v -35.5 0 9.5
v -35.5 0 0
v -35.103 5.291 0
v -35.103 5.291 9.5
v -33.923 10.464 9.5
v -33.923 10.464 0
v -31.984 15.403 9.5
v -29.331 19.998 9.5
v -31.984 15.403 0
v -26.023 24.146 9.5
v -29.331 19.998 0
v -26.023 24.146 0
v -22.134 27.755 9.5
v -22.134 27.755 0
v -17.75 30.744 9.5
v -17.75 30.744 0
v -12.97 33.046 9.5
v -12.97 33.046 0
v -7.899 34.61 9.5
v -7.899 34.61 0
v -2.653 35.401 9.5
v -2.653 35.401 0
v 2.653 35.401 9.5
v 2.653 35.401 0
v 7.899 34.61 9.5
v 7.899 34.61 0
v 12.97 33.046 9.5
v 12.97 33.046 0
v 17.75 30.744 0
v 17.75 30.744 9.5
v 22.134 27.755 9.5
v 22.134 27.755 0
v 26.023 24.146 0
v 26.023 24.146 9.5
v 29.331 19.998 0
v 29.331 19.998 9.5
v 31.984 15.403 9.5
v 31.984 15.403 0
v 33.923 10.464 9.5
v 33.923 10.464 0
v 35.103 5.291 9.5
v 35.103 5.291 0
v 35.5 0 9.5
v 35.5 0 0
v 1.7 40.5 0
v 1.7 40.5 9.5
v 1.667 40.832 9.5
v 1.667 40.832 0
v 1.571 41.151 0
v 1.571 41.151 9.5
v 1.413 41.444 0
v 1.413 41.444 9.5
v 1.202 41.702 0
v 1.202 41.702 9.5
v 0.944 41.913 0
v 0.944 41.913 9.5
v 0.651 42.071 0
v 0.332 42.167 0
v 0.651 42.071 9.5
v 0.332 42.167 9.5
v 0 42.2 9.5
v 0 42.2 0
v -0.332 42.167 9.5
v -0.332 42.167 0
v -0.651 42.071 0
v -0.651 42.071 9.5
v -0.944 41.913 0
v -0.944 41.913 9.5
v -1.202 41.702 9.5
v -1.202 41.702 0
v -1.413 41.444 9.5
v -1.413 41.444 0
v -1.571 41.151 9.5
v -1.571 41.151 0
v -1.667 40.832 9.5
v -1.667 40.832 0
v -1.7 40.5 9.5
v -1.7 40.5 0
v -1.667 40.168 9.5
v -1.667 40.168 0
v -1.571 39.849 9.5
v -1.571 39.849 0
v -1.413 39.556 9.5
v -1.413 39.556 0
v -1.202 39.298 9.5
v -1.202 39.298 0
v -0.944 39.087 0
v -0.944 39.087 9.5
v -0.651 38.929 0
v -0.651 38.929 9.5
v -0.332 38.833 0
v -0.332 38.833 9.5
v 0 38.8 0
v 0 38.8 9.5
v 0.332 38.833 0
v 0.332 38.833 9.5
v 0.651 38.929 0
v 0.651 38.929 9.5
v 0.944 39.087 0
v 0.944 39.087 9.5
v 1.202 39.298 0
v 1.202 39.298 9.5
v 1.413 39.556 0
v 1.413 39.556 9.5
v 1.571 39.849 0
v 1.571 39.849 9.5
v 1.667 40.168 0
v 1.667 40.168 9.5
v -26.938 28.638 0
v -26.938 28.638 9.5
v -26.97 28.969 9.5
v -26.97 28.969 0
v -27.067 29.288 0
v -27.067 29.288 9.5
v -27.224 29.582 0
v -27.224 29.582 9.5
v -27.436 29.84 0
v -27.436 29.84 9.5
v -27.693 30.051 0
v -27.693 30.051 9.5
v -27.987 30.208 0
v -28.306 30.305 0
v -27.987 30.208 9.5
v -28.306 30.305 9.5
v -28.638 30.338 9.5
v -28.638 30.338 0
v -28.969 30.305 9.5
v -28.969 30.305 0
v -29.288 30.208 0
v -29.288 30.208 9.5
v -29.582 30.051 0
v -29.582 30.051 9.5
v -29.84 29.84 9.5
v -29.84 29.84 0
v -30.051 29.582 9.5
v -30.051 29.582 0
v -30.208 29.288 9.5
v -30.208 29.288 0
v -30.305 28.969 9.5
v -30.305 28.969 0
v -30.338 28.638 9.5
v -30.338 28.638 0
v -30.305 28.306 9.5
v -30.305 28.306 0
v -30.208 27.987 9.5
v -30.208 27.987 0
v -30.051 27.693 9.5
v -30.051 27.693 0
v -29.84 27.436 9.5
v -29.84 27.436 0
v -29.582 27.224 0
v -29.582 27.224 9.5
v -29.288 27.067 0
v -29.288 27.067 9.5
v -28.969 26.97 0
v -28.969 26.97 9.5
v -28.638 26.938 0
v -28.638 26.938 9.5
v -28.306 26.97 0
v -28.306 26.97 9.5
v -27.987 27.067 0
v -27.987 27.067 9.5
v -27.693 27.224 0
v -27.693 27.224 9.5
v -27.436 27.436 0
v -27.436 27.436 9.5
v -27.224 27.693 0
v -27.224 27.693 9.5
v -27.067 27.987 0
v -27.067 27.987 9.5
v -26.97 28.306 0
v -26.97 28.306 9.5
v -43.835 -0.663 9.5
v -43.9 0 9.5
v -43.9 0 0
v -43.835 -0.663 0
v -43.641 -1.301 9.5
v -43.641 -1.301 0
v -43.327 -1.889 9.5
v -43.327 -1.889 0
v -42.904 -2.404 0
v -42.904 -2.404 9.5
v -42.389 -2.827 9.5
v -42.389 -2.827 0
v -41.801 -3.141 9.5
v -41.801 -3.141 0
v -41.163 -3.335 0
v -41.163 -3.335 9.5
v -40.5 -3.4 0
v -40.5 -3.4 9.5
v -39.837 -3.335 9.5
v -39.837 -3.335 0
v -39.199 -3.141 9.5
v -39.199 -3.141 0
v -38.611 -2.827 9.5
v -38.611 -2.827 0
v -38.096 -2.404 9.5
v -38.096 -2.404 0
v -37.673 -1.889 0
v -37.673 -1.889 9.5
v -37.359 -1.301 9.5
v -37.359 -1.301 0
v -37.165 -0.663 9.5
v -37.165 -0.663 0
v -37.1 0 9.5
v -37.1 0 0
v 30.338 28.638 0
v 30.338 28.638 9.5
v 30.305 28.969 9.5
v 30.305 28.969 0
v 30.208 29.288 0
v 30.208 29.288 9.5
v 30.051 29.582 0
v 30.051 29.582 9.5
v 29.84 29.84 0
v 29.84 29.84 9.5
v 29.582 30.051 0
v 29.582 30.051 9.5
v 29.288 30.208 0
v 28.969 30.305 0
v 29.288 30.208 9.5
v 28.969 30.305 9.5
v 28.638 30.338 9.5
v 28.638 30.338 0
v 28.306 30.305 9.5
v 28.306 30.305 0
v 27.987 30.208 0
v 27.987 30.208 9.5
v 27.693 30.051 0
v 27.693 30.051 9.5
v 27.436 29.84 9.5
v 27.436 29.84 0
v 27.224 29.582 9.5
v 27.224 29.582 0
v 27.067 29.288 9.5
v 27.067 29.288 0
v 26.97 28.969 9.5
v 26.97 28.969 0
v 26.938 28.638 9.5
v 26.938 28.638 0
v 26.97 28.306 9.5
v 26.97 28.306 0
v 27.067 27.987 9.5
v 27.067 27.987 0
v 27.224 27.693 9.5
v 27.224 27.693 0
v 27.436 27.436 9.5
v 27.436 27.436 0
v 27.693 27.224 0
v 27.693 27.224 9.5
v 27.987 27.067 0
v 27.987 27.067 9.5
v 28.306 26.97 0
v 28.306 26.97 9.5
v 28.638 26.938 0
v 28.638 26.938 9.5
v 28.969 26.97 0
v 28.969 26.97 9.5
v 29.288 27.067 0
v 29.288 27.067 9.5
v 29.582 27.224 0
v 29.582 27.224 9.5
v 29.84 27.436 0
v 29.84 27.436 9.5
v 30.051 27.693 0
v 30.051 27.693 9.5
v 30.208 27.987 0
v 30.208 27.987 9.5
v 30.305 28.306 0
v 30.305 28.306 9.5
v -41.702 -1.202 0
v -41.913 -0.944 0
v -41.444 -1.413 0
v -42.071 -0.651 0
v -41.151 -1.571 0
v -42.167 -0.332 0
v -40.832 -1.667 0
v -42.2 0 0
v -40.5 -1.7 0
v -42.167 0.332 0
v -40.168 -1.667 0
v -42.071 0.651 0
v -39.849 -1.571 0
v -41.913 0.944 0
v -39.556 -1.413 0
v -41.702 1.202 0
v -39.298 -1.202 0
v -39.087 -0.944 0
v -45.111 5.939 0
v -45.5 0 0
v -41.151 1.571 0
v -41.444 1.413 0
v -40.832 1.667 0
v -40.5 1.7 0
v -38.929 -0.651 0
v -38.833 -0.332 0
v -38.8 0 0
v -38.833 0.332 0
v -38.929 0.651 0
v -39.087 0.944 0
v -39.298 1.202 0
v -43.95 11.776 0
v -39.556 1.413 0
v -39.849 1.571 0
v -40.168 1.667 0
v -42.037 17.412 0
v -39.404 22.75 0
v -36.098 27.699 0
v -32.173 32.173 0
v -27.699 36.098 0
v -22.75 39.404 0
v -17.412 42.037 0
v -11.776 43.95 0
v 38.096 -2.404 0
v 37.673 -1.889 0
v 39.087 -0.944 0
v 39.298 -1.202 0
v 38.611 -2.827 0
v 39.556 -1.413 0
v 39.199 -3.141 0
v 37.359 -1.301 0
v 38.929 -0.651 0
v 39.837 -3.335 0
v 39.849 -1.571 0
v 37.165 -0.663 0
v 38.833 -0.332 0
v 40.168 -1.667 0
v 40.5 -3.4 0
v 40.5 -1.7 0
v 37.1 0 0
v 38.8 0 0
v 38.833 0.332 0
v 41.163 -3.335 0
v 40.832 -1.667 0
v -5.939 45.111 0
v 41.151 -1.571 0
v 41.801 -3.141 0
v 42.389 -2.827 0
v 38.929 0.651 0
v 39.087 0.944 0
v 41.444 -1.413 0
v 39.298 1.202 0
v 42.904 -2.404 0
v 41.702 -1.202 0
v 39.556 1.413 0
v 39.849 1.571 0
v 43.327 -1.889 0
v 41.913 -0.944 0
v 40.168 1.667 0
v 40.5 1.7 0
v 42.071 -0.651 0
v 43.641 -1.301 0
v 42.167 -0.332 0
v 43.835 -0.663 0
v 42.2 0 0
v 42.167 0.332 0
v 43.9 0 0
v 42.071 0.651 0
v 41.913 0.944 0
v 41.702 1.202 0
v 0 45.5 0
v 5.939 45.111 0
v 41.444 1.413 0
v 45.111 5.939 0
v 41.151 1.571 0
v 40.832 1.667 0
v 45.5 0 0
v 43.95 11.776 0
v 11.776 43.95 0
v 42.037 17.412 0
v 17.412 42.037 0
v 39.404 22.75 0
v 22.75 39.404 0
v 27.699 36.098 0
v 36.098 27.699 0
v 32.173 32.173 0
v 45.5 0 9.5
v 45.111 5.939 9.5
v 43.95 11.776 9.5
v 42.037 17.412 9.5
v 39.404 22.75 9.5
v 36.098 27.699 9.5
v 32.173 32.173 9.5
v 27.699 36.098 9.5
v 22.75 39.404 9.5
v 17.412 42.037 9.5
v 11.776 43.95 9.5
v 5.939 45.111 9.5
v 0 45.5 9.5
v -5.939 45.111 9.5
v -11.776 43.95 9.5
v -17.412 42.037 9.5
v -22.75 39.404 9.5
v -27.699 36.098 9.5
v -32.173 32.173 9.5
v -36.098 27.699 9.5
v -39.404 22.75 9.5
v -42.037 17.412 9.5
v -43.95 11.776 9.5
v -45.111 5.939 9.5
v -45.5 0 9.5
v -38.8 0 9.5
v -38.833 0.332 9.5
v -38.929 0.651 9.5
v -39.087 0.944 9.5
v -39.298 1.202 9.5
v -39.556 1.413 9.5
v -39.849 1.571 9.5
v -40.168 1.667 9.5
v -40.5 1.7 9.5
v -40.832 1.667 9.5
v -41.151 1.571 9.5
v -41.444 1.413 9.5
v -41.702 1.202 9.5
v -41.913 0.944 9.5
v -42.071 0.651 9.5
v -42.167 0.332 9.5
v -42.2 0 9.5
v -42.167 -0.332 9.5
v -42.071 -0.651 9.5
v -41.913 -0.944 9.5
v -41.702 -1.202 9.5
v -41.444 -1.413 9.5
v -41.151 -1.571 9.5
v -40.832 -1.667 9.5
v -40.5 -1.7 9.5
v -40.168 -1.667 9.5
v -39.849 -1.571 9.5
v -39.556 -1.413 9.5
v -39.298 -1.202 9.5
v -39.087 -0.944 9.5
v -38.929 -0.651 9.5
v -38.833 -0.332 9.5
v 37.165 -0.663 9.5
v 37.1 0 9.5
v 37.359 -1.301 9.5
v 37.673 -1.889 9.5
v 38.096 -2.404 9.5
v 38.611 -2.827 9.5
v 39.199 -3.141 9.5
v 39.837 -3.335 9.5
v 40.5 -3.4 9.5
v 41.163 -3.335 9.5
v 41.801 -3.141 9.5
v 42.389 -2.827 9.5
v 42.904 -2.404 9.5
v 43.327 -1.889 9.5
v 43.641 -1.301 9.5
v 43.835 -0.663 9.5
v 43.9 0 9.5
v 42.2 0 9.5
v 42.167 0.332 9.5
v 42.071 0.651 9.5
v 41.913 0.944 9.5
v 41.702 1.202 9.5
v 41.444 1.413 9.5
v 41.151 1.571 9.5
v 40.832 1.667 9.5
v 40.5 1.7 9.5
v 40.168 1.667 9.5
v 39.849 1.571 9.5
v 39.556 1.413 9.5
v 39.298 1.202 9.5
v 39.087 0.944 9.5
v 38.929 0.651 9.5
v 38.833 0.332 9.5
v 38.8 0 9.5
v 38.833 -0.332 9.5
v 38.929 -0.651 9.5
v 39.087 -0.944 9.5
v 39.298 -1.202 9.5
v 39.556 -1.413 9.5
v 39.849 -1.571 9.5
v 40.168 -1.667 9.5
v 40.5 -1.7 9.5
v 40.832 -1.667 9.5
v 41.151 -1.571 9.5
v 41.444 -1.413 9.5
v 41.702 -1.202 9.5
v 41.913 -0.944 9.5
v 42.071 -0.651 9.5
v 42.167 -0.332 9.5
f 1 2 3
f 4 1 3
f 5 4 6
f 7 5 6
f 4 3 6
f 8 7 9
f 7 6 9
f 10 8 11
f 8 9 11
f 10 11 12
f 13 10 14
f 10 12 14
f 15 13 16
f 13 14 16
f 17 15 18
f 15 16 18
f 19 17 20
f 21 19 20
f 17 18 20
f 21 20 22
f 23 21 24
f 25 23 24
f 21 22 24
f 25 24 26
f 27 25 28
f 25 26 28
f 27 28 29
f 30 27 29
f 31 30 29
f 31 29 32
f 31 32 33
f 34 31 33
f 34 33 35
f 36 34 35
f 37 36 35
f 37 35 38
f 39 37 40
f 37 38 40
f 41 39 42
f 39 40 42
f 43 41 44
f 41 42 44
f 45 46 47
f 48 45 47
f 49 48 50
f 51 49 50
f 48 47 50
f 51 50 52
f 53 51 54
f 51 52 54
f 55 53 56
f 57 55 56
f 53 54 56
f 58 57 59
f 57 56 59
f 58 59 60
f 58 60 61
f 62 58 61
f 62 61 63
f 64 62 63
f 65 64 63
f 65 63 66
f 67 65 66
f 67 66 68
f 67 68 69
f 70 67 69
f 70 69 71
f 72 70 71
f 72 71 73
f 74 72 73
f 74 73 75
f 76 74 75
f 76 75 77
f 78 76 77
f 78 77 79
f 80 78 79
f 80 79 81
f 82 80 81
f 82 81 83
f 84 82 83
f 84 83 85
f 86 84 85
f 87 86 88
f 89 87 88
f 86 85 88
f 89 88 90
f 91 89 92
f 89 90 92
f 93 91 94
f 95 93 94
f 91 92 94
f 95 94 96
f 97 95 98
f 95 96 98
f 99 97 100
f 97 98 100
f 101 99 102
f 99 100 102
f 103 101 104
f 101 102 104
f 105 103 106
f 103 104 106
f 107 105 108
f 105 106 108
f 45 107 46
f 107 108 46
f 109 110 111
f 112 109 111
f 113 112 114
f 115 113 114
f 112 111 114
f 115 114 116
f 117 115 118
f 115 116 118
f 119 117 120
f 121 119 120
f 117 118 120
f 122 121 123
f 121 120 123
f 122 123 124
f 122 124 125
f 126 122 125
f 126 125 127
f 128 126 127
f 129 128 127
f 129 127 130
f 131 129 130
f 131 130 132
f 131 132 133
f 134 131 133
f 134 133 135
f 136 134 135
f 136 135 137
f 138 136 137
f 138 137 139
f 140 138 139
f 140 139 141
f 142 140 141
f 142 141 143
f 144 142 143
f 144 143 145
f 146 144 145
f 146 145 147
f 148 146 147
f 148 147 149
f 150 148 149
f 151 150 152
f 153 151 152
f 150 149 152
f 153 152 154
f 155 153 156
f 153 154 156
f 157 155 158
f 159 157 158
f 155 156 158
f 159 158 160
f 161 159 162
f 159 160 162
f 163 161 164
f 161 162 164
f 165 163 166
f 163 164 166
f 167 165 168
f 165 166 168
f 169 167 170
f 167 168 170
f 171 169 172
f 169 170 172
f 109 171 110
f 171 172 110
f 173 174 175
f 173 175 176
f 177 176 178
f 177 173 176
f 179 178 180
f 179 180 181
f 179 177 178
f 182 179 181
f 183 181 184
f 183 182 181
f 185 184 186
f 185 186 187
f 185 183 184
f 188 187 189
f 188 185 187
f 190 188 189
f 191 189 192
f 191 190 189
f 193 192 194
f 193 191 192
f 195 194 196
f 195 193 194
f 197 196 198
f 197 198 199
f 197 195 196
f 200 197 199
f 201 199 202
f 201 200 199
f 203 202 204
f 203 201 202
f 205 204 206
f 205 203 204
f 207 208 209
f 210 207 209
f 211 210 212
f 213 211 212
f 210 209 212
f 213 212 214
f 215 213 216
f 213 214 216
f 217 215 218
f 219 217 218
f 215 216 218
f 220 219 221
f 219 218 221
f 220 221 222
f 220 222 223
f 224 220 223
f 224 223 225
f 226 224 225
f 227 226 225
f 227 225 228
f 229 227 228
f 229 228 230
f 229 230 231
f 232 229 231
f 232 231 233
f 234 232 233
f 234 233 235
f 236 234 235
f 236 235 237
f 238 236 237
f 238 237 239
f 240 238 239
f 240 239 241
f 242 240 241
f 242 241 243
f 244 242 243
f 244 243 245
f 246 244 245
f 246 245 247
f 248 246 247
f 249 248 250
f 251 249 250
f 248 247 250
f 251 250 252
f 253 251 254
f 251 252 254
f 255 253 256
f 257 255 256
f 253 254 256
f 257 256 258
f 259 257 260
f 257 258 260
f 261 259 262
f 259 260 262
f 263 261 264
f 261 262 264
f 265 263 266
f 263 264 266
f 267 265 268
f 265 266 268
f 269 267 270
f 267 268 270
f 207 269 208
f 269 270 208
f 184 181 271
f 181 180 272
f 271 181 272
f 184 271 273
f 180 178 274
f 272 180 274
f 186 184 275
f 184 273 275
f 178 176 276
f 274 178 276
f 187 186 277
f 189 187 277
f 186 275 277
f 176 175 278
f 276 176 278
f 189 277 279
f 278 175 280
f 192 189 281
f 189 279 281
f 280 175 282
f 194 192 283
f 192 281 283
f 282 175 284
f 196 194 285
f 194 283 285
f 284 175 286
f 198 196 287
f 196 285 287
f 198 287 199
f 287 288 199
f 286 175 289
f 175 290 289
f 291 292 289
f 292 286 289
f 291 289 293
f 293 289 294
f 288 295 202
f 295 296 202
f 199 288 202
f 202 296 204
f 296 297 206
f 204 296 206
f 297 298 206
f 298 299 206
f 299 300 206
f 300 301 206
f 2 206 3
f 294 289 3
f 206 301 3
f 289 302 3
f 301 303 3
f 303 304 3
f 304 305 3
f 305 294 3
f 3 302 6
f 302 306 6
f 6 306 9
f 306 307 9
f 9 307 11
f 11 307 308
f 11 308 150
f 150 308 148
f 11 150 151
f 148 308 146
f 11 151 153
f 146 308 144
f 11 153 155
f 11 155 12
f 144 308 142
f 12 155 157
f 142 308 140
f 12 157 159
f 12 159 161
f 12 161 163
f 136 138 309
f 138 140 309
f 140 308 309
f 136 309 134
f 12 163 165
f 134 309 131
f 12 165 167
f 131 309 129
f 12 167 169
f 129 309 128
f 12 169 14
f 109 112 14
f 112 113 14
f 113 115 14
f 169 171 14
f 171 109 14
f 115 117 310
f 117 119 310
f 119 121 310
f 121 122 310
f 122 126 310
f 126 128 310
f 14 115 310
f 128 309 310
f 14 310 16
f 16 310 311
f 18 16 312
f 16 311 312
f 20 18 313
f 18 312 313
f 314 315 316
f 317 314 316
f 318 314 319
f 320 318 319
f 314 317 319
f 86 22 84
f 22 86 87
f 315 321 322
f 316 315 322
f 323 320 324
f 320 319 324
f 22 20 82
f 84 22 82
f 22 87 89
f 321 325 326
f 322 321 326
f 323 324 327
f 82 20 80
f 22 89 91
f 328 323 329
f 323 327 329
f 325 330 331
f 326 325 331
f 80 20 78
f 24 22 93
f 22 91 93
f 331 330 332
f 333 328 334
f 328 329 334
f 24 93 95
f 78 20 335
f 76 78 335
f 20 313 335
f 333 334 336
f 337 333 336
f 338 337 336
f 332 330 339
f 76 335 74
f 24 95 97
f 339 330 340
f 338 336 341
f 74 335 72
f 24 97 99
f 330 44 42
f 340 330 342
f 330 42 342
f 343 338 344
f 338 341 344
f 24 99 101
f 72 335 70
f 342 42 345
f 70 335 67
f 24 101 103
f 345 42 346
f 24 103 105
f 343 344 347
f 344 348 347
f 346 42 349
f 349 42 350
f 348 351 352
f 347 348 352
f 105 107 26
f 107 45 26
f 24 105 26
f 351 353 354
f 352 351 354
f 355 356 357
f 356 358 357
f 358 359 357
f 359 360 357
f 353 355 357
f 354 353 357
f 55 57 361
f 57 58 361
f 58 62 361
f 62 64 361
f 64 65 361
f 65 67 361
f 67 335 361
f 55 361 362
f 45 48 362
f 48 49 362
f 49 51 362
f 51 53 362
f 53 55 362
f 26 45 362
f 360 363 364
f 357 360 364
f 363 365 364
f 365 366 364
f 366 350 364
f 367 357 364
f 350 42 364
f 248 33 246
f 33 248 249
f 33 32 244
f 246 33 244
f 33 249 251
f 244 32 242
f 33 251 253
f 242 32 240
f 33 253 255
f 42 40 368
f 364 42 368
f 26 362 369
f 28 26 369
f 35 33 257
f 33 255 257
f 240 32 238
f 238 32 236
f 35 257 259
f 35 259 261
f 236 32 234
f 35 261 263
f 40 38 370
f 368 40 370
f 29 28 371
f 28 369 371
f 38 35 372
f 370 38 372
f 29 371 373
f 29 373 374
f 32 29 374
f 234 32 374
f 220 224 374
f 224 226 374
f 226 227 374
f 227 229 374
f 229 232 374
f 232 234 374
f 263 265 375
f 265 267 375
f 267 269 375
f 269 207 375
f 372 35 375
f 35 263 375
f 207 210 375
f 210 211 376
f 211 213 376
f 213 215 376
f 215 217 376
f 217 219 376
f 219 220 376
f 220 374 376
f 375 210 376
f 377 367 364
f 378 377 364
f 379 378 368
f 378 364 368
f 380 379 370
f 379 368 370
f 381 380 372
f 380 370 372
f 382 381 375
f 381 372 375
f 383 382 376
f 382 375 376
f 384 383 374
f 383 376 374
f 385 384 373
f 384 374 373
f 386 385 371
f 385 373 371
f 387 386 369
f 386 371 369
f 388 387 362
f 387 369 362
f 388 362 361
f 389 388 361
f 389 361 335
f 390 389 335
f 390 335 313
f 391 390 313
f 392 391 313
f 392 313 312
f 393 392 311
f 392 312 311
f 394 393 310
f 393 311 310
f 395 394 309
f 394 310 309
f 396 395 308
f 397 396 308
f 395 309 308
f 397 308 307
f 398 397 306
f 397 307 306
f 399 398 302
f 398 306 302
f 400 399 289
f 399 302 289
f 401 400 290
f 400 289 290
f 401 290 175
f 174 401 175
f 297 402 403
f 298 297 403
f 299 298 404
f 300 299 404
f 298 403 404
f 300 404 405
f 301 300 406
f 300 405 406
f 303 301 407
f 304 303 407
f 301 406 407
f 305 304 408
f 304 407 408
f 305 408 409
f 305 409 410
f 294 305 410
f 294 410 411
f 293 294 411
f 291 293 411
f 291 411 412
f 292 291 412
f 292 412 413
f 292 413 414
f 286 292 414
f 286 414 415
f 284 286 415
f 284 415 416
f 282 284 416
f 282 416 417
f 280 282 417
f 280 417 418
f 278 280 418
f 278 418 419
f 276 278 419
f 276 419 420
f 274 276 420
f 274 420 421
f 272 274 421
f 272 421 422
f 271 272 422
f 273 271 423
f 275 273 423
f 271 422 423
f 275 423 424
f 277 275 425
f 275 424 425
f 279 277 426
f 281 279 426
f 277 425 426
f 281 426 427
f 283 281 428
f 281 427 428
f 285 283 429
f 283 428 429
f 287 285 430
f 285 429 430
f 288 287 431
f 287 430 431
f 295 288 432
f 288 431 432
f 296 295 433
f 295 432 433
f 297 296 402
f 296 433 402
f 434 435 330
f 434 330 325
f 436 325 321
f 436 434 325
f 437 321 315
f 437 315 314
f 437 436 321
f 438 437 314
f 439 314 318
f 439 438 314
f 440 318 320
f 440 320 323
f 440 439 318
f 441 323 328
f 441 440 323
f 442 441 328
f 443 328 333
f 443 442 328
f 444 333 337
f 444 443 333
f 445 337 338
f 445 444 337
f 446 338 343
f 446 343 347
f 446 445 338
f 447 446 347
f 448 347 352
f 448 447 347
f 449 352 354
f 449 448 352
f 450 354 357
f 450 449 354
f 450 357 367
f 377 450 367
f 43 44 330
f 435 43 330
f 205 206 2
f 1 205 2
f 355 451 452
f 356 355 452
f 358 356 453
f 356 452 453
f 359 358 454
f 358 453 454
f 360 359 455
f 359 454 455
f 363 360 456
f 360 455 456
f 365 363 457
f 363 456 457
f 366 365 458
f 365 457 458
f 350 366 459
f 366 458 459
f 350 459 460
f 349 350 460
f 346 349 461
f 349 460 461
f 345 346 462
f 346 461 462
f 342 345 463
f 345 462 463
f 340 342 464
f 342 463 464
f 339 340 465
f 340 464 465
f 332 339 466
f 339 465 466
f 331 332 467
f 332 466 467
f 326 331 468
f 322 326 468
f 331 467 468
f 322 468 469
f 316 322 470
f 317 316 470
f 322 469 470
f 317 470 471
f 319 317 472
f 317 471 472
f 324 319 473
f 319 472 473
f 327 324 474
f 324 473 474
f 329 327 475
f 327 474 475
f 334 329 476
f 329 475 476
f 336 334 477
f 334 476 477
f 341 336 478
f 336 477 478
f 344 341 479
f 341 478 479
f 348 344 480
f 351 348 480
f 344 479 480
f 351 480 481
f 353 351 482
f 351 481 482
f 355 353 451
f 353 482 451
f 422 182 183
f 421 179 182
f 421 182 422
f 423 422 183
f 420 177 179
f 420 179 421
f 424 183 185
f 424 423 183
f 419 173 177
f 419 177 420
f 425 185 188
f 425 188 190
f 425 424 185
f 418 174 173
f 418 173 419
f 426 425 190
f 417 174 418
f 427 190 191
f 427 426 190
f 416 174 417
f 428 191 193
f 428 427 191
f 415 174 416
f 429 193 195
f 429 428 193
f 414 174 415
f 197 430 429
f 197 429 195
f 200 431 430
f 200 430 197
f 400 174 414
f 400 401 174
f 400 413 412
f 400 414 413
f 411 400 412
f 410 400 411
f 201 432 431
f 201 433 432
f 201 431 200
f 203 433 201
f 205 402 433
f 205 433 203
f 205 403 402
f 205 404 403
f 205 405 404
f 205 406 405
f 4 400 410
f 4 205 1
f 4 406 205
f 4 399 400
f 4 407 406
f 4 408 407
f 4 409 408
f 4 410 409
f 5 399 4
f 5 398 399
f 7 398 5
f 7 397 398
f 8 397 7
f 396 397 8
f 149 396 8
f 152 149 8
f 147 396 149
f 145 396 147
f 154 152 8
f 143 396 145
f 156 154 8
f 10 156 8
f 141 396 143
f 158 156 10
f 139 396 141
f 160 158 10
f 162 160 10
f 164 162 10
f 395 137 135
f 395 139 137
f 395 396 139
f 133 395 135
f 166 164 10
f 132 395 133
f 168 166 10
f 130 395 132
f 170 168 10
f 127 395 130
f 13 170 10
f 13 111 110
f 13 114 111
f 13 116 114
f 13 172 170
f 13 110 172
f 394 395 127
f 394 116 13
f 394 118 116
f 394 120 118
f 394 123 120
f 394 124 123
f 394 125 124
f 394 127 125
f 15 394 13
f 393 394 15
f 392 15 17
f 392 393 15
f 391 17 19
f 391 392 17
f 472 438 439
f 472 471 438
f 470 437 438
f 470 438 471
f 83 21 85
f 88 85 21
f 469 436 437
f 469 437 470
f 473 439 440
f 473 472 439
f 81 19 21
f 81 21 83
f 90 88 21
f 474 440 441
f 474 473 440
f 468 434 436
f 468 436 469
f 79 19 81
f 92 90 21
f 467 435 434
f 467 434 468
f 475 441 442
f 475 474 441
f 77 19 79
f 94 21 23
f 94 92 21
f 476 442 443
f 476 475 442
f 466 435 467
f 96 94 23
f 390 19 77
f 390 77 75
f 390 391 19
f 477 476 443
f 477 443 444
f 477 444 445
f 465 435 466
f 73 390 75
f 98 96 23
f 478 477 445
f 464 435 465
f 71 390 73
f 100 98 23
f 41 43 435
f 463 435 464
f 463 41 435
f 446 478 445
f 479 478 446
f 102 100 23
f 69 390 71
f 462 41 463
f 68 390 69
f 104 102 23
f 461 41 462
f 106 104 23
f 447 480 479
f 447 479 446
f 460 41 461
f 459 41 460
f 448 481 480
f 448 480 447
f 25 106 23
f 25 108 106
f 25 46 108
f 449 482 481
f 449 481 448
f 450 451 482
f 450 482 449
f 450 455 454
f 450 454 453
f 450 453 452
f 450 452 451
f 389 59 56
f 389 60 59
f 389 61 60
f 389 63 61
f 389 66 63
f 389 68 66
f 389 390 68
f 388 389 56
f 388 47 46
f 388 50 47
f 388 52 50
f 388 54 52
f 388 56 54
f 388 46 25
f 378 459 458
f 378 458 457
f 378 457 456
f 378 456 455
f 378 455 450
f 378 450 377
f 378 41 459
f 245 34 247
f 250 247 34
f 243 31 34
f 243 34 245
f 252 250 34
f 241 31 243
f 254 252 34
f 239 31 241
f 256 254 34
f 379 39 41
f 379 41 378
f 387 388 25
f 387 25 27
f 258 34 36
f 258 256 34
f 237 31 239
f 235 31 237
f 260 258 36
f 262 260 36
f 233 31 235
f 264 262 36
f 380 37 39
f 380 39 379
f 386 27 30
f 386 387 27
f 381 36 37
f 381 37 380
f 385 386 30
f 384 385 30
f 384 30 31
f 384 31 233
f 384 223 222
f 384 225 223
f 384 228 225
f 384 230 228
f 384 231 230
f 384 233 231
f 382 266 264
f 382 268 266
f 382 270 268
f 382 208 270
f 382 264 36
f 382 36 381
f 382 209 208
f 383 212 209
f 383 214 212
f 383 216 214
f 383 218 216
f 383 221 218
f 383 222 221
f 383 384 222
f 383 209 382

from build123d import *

# Parameters (mm, degrees)
SALIENTE_EXTRUIR1_DEPTH = 9.5
CROQUIS2_R              = 1.7
CORTAR_EXTRUIR1_DEPTH   = 10.5
CROQUIS3_R              = 3.4
CROQUIS3_R_2            = 1.7
SALIENTE_EXTRUIR2_DEPTH = 9.5


with BuildPart() as part:
    # Croquis1 → Saliente-Extruir1 (new body)
    with BuildSketch(Plane.XY):
        with BuildLine():
            Line((-45.5, 0), (-35.5, 0))
            ThreePointArc((-35.5, 0), (0, 35.5), (35.5, 0))
            Line((35.5, 0), (45.5, 0))
            ThreePointArc((45.5, 0), (0, 45.5), (-45.5, 0))
        make_face()
    extrude(amount=SALIENTE_EXTRUIR1_DEPTH)

    # Croquis2 → Cortar-Extruir1 (cut, through all)
    with BuildSketch(Plane.XY.offset(9.5)):
        with Locations((0, 40.5)):
            Circle(CROQUIS2_R)
        with Locations((28.637824638, 28.637824638)):
            Circle(CROQUIS2_R)
        with Locations((40.5, 0)):
            Circle(CROQUIS2_R)
        with Locations((-40.5, 0)):
            Circle(CROQUIS2_R)
        with Locations((-28.637824638, 28.637824638)):
            Circle(CROQUIS2_R)
    extrude(amount=-CORTAR_EXTRUIR1_DEPTH, mode=Mode.SUBTRACT)

    # Croquis3 → Saliente-Extruir2 (add)
    with BuildSketch(Plane.XY.offset(9.5)):
        with Locations((-40.5, 0)):
            Circle(CROQUIS3_R)
        with Locations((-40.5, 0)):
            Circle(CROQUIS3_R_2, mode=Mode.SUBTRACT)
        with Locations((40.5, 0)):
            Circle(CROQUIS3_R)
        with Locations((40.5, 0)):
            Circle(CROQUIS3_R_2, mode=Mode.SUBTRACT)
    extrude(amount=-SALIENTE_EXTRUIR2_DEPTH)


solid = part.part
